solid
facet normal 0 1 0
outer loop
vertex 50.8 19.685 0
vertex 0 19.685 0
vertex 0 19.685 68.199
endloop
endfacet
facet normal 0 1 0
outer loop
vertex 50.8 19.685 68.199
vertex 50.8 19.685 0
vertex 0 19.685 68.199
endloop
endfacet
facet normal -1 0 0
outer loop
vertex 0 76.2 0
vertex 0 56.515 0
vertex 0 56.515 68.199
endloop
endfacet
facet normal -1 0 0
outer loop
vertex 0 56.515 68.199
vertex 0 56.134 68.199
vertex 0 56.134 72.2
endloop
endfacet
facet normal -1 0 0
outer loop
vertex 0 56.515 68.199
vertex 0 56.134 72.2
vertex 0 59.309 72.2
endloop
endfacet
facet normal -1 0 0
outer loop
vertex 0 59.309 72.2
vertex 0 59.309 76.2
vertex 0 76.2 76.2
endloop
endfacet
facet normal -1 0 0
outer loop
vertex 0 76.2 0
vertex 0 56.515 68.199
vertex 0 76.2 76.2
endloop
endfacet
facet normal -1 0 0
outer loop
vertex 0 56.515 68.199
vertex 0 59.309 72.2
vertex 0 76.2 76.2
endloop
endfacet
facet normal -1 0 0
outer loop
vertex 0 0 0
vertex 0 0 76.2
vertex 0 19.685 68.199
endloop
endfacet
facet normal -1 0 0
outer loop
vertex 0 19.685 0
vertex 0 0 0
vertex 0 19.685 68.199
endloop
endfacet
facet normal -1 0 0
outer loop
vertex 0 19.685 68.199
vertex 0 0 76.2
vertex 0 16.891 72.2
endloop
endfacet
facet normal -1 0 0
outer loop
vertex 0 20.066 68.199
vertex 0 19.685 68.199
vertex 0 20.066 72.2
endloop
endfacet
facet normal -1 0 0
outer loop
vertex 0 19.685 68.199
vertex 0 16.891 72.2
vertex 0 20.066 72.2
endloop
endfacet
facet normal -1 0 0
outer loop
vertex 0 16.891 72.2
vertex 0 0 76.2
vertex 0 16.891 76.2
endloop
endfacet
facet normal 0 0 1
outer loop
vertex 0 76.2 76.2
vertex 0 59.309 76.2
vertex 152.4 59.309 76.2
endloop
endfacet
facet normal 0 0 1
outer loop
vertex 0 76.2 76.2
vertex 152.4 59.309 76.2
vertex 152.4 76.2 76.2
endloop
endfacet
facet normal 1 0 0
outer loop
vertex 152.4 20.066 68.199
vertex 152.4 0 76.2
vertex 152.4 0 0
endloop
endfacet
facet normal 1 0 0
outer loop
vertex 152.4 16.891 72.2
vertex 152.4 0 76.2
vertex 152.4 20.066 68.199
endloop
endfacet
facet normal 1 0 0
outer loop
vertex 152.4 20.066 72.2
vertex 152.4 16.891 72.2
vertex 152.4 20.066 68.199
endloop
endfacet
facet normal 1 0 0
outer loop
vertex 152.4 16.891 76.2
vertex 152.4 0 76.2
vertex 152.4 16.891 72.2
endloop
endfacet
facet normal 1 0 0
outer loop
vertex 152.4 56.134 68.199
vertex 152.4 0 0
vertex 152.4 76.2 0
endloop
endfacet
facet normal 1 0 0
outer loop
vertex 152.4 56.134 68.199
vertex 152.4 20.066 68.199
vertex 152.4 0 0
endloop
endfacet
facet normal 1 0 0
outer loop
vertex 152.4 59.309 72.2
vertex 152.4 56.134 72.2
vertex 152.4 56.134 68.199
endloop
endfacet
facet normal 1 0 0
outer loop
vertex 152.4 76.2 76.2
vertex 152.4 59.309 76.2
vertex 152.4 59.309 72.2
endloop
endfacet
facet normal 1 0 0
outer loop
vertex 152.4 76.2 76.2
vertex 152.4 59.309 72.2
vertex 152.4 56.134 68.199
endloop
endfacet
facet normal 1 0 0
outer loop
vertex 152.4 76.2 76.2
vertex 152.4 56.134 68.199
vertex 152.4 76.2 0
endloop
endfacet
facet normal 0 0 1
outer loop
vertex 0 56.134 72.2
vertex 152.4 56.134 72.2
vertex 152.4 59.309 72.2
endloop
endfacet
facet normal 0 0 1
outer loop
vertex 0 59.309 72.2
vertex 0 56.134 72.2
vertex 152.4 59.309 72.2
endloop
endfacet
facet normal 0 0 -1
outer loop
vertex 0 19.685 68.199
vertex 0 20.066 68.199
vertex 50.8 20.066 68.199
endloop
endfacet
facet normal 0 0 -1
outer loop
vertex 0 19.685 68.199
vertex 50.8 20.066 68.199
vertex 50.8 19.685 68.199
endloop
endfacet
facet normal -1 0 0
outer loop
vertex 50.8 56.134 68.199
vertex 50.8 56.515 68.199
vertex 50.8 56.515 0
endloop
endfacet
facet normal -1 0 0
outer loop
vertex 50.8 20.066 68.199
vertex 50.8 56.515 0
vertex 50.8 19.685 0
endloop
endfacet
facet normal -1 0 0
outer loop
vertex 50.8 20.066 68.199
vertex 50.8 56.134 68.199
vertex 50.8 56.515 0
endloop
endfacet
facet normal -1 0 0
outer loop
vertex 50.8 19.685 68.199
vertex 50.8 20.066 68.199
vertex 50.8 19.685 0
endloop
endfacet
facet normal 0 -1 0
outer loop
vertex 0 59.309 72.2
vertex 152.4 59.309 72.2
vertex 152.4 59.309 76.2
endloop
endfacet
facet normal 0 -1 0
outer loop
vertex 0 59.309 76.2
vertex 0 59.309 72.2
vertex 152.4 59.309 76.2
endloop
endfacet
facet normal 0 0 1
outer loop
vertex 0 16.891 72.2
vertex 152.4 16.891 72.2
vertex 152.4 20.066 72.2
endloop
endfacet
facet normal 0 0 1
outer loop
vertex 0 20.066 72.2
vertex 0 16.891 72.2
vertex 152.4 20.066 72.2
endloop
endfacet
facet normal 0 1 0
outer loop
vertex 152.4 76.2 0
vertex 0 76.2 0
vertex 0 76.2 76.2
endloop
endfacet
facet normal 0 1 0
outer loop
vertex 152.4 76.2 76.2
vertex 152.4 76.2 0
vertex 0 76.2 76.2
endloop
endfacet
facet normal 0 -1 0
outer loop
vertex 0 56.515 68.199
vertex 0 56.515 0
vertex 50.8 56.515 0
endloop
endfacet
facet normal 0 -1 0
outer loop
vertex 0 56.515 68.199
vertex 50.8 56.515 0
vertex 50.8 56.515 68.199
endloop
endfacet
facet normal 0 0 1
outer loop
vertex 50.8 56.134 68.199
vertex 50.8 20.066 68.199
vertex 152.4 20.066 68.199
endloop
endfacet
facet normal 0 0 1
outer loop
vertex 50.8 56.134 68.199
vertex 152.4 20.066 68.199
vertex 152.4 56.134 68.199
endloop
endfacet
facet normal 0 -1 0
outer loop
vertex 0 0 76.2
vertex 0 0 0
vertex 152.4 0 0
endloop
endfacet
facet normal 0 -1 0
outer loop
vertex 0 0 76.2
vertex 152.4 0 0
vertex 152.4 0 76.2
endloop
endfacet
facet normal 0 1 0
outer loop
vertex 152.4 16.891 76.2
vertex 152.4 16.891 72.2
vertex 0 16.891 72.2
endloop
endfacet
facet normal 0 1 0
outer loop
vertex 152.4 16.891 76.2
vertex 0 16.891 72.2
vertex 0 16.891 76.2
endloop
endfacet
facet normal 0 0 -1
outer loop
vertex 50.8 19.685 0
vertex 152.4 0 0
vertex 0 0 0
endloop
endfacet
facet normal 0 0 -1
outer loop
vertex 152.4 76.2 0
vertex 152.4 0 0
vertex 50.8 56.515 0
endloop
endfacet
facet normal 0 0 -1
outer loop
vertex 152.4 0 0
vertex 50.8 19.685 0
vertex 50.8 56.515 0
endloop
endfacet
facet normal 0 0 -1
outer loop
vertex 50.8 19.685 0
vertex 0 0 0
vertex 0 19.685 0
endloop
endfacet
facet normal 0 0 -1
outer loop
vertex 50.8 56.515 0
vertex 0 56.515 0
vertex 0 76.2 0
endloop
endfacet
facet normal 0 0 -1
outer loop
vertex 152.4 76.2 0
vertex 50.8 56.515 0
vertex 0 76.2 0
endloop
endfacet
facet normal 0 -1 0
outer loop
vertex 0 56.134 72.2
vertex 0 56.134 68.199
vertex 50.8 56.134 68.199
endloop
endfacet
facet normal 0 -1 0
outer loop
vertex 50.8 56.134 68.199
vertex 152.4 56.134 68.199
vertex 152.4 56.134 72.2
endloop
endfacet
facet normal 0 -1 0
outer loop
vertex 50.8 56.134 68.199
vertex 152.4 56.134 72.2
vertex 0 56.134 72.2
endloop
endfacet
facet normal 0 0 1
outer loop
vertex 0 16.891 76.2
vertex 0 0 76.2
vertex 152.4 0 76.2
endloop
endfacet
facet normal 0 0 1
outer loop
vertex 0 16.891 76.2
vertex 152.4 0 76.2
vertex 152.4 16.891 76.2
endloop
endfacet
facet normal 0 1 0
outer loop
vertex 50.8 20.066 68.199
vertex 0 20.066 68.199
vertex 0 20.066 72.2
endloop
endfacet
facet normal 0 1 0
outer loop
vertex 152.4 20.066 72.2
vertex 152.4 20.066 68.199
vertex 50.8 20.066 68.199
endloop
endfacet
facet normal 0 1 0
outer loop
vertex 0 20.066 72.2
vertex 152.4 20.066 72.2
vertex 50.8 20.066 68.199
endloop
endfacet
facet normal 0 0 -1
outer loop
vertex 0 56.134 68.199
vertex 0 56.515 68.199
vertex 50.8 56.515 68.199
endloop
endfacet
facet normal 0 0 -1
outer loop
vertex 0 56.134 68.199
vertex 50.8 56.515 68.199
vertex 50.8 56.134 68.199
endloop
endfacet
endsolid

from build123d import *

# Parameters (mm, degrees)
F0_W     = 76.2
F0_H     = 76.2
F1_DEPTH = 152.4
F2_W     = 36.068
F2_H     = 8.001
F3_DEPTH = 152.401
F4_W     = 3.175
F4_H     = 4.0005
F5_DEPTH = 152.401
F6_W     = 36.83
F6_H     = 68.199
F7_DEPTH = 50.8


with BuildPart() as f1:
    # F0 (on Right) → F1 (new body)
    with BuildSketch(Plane.YZ):
        with Locations((38.1, 38.1)):
            Rectangle(F0_W, F0_H)
    extrude(amount=F1_DEPTH)

    # F2 (on face) → F3 (cut, through all)
    with BuildSketch(Plane.YZ.offset(152.4)):
        with Locations((38.1, 72.1995)):
            Rectangle(F2_W, F2_H)
    extrude(amount=-F3_DEPTH, mode=Mode.SUBTRACT)

    # F4 (on face) → F5 (cut, through all)
    with BuildSketch(Plane.YZ.offset(152.4)):
        with Locations((18.4785, 74.19975)):
            Rectangle(F4_W, F4_H)
        with Locations((57.7215, 74.19975)):
            Rectangle(F4_W, F4_H)
    extrude(amount=-F5_DEPTH, mode=Mode.SUBTRACT)

    # F6 (on face) → F7 (cut)
    with BuildSketch(Plane(origin=(0, 0, 0), x_dir=(0, -1, 0), z_dir=(-1, 0, 0))):
        with Locations((-38.1, 34.0995)):
            Rectangle(F6_W, F6_H)
    extrude(amount=-F7_DEPTH, mode=Mode.SUBTRACT)


solid = f1.part
